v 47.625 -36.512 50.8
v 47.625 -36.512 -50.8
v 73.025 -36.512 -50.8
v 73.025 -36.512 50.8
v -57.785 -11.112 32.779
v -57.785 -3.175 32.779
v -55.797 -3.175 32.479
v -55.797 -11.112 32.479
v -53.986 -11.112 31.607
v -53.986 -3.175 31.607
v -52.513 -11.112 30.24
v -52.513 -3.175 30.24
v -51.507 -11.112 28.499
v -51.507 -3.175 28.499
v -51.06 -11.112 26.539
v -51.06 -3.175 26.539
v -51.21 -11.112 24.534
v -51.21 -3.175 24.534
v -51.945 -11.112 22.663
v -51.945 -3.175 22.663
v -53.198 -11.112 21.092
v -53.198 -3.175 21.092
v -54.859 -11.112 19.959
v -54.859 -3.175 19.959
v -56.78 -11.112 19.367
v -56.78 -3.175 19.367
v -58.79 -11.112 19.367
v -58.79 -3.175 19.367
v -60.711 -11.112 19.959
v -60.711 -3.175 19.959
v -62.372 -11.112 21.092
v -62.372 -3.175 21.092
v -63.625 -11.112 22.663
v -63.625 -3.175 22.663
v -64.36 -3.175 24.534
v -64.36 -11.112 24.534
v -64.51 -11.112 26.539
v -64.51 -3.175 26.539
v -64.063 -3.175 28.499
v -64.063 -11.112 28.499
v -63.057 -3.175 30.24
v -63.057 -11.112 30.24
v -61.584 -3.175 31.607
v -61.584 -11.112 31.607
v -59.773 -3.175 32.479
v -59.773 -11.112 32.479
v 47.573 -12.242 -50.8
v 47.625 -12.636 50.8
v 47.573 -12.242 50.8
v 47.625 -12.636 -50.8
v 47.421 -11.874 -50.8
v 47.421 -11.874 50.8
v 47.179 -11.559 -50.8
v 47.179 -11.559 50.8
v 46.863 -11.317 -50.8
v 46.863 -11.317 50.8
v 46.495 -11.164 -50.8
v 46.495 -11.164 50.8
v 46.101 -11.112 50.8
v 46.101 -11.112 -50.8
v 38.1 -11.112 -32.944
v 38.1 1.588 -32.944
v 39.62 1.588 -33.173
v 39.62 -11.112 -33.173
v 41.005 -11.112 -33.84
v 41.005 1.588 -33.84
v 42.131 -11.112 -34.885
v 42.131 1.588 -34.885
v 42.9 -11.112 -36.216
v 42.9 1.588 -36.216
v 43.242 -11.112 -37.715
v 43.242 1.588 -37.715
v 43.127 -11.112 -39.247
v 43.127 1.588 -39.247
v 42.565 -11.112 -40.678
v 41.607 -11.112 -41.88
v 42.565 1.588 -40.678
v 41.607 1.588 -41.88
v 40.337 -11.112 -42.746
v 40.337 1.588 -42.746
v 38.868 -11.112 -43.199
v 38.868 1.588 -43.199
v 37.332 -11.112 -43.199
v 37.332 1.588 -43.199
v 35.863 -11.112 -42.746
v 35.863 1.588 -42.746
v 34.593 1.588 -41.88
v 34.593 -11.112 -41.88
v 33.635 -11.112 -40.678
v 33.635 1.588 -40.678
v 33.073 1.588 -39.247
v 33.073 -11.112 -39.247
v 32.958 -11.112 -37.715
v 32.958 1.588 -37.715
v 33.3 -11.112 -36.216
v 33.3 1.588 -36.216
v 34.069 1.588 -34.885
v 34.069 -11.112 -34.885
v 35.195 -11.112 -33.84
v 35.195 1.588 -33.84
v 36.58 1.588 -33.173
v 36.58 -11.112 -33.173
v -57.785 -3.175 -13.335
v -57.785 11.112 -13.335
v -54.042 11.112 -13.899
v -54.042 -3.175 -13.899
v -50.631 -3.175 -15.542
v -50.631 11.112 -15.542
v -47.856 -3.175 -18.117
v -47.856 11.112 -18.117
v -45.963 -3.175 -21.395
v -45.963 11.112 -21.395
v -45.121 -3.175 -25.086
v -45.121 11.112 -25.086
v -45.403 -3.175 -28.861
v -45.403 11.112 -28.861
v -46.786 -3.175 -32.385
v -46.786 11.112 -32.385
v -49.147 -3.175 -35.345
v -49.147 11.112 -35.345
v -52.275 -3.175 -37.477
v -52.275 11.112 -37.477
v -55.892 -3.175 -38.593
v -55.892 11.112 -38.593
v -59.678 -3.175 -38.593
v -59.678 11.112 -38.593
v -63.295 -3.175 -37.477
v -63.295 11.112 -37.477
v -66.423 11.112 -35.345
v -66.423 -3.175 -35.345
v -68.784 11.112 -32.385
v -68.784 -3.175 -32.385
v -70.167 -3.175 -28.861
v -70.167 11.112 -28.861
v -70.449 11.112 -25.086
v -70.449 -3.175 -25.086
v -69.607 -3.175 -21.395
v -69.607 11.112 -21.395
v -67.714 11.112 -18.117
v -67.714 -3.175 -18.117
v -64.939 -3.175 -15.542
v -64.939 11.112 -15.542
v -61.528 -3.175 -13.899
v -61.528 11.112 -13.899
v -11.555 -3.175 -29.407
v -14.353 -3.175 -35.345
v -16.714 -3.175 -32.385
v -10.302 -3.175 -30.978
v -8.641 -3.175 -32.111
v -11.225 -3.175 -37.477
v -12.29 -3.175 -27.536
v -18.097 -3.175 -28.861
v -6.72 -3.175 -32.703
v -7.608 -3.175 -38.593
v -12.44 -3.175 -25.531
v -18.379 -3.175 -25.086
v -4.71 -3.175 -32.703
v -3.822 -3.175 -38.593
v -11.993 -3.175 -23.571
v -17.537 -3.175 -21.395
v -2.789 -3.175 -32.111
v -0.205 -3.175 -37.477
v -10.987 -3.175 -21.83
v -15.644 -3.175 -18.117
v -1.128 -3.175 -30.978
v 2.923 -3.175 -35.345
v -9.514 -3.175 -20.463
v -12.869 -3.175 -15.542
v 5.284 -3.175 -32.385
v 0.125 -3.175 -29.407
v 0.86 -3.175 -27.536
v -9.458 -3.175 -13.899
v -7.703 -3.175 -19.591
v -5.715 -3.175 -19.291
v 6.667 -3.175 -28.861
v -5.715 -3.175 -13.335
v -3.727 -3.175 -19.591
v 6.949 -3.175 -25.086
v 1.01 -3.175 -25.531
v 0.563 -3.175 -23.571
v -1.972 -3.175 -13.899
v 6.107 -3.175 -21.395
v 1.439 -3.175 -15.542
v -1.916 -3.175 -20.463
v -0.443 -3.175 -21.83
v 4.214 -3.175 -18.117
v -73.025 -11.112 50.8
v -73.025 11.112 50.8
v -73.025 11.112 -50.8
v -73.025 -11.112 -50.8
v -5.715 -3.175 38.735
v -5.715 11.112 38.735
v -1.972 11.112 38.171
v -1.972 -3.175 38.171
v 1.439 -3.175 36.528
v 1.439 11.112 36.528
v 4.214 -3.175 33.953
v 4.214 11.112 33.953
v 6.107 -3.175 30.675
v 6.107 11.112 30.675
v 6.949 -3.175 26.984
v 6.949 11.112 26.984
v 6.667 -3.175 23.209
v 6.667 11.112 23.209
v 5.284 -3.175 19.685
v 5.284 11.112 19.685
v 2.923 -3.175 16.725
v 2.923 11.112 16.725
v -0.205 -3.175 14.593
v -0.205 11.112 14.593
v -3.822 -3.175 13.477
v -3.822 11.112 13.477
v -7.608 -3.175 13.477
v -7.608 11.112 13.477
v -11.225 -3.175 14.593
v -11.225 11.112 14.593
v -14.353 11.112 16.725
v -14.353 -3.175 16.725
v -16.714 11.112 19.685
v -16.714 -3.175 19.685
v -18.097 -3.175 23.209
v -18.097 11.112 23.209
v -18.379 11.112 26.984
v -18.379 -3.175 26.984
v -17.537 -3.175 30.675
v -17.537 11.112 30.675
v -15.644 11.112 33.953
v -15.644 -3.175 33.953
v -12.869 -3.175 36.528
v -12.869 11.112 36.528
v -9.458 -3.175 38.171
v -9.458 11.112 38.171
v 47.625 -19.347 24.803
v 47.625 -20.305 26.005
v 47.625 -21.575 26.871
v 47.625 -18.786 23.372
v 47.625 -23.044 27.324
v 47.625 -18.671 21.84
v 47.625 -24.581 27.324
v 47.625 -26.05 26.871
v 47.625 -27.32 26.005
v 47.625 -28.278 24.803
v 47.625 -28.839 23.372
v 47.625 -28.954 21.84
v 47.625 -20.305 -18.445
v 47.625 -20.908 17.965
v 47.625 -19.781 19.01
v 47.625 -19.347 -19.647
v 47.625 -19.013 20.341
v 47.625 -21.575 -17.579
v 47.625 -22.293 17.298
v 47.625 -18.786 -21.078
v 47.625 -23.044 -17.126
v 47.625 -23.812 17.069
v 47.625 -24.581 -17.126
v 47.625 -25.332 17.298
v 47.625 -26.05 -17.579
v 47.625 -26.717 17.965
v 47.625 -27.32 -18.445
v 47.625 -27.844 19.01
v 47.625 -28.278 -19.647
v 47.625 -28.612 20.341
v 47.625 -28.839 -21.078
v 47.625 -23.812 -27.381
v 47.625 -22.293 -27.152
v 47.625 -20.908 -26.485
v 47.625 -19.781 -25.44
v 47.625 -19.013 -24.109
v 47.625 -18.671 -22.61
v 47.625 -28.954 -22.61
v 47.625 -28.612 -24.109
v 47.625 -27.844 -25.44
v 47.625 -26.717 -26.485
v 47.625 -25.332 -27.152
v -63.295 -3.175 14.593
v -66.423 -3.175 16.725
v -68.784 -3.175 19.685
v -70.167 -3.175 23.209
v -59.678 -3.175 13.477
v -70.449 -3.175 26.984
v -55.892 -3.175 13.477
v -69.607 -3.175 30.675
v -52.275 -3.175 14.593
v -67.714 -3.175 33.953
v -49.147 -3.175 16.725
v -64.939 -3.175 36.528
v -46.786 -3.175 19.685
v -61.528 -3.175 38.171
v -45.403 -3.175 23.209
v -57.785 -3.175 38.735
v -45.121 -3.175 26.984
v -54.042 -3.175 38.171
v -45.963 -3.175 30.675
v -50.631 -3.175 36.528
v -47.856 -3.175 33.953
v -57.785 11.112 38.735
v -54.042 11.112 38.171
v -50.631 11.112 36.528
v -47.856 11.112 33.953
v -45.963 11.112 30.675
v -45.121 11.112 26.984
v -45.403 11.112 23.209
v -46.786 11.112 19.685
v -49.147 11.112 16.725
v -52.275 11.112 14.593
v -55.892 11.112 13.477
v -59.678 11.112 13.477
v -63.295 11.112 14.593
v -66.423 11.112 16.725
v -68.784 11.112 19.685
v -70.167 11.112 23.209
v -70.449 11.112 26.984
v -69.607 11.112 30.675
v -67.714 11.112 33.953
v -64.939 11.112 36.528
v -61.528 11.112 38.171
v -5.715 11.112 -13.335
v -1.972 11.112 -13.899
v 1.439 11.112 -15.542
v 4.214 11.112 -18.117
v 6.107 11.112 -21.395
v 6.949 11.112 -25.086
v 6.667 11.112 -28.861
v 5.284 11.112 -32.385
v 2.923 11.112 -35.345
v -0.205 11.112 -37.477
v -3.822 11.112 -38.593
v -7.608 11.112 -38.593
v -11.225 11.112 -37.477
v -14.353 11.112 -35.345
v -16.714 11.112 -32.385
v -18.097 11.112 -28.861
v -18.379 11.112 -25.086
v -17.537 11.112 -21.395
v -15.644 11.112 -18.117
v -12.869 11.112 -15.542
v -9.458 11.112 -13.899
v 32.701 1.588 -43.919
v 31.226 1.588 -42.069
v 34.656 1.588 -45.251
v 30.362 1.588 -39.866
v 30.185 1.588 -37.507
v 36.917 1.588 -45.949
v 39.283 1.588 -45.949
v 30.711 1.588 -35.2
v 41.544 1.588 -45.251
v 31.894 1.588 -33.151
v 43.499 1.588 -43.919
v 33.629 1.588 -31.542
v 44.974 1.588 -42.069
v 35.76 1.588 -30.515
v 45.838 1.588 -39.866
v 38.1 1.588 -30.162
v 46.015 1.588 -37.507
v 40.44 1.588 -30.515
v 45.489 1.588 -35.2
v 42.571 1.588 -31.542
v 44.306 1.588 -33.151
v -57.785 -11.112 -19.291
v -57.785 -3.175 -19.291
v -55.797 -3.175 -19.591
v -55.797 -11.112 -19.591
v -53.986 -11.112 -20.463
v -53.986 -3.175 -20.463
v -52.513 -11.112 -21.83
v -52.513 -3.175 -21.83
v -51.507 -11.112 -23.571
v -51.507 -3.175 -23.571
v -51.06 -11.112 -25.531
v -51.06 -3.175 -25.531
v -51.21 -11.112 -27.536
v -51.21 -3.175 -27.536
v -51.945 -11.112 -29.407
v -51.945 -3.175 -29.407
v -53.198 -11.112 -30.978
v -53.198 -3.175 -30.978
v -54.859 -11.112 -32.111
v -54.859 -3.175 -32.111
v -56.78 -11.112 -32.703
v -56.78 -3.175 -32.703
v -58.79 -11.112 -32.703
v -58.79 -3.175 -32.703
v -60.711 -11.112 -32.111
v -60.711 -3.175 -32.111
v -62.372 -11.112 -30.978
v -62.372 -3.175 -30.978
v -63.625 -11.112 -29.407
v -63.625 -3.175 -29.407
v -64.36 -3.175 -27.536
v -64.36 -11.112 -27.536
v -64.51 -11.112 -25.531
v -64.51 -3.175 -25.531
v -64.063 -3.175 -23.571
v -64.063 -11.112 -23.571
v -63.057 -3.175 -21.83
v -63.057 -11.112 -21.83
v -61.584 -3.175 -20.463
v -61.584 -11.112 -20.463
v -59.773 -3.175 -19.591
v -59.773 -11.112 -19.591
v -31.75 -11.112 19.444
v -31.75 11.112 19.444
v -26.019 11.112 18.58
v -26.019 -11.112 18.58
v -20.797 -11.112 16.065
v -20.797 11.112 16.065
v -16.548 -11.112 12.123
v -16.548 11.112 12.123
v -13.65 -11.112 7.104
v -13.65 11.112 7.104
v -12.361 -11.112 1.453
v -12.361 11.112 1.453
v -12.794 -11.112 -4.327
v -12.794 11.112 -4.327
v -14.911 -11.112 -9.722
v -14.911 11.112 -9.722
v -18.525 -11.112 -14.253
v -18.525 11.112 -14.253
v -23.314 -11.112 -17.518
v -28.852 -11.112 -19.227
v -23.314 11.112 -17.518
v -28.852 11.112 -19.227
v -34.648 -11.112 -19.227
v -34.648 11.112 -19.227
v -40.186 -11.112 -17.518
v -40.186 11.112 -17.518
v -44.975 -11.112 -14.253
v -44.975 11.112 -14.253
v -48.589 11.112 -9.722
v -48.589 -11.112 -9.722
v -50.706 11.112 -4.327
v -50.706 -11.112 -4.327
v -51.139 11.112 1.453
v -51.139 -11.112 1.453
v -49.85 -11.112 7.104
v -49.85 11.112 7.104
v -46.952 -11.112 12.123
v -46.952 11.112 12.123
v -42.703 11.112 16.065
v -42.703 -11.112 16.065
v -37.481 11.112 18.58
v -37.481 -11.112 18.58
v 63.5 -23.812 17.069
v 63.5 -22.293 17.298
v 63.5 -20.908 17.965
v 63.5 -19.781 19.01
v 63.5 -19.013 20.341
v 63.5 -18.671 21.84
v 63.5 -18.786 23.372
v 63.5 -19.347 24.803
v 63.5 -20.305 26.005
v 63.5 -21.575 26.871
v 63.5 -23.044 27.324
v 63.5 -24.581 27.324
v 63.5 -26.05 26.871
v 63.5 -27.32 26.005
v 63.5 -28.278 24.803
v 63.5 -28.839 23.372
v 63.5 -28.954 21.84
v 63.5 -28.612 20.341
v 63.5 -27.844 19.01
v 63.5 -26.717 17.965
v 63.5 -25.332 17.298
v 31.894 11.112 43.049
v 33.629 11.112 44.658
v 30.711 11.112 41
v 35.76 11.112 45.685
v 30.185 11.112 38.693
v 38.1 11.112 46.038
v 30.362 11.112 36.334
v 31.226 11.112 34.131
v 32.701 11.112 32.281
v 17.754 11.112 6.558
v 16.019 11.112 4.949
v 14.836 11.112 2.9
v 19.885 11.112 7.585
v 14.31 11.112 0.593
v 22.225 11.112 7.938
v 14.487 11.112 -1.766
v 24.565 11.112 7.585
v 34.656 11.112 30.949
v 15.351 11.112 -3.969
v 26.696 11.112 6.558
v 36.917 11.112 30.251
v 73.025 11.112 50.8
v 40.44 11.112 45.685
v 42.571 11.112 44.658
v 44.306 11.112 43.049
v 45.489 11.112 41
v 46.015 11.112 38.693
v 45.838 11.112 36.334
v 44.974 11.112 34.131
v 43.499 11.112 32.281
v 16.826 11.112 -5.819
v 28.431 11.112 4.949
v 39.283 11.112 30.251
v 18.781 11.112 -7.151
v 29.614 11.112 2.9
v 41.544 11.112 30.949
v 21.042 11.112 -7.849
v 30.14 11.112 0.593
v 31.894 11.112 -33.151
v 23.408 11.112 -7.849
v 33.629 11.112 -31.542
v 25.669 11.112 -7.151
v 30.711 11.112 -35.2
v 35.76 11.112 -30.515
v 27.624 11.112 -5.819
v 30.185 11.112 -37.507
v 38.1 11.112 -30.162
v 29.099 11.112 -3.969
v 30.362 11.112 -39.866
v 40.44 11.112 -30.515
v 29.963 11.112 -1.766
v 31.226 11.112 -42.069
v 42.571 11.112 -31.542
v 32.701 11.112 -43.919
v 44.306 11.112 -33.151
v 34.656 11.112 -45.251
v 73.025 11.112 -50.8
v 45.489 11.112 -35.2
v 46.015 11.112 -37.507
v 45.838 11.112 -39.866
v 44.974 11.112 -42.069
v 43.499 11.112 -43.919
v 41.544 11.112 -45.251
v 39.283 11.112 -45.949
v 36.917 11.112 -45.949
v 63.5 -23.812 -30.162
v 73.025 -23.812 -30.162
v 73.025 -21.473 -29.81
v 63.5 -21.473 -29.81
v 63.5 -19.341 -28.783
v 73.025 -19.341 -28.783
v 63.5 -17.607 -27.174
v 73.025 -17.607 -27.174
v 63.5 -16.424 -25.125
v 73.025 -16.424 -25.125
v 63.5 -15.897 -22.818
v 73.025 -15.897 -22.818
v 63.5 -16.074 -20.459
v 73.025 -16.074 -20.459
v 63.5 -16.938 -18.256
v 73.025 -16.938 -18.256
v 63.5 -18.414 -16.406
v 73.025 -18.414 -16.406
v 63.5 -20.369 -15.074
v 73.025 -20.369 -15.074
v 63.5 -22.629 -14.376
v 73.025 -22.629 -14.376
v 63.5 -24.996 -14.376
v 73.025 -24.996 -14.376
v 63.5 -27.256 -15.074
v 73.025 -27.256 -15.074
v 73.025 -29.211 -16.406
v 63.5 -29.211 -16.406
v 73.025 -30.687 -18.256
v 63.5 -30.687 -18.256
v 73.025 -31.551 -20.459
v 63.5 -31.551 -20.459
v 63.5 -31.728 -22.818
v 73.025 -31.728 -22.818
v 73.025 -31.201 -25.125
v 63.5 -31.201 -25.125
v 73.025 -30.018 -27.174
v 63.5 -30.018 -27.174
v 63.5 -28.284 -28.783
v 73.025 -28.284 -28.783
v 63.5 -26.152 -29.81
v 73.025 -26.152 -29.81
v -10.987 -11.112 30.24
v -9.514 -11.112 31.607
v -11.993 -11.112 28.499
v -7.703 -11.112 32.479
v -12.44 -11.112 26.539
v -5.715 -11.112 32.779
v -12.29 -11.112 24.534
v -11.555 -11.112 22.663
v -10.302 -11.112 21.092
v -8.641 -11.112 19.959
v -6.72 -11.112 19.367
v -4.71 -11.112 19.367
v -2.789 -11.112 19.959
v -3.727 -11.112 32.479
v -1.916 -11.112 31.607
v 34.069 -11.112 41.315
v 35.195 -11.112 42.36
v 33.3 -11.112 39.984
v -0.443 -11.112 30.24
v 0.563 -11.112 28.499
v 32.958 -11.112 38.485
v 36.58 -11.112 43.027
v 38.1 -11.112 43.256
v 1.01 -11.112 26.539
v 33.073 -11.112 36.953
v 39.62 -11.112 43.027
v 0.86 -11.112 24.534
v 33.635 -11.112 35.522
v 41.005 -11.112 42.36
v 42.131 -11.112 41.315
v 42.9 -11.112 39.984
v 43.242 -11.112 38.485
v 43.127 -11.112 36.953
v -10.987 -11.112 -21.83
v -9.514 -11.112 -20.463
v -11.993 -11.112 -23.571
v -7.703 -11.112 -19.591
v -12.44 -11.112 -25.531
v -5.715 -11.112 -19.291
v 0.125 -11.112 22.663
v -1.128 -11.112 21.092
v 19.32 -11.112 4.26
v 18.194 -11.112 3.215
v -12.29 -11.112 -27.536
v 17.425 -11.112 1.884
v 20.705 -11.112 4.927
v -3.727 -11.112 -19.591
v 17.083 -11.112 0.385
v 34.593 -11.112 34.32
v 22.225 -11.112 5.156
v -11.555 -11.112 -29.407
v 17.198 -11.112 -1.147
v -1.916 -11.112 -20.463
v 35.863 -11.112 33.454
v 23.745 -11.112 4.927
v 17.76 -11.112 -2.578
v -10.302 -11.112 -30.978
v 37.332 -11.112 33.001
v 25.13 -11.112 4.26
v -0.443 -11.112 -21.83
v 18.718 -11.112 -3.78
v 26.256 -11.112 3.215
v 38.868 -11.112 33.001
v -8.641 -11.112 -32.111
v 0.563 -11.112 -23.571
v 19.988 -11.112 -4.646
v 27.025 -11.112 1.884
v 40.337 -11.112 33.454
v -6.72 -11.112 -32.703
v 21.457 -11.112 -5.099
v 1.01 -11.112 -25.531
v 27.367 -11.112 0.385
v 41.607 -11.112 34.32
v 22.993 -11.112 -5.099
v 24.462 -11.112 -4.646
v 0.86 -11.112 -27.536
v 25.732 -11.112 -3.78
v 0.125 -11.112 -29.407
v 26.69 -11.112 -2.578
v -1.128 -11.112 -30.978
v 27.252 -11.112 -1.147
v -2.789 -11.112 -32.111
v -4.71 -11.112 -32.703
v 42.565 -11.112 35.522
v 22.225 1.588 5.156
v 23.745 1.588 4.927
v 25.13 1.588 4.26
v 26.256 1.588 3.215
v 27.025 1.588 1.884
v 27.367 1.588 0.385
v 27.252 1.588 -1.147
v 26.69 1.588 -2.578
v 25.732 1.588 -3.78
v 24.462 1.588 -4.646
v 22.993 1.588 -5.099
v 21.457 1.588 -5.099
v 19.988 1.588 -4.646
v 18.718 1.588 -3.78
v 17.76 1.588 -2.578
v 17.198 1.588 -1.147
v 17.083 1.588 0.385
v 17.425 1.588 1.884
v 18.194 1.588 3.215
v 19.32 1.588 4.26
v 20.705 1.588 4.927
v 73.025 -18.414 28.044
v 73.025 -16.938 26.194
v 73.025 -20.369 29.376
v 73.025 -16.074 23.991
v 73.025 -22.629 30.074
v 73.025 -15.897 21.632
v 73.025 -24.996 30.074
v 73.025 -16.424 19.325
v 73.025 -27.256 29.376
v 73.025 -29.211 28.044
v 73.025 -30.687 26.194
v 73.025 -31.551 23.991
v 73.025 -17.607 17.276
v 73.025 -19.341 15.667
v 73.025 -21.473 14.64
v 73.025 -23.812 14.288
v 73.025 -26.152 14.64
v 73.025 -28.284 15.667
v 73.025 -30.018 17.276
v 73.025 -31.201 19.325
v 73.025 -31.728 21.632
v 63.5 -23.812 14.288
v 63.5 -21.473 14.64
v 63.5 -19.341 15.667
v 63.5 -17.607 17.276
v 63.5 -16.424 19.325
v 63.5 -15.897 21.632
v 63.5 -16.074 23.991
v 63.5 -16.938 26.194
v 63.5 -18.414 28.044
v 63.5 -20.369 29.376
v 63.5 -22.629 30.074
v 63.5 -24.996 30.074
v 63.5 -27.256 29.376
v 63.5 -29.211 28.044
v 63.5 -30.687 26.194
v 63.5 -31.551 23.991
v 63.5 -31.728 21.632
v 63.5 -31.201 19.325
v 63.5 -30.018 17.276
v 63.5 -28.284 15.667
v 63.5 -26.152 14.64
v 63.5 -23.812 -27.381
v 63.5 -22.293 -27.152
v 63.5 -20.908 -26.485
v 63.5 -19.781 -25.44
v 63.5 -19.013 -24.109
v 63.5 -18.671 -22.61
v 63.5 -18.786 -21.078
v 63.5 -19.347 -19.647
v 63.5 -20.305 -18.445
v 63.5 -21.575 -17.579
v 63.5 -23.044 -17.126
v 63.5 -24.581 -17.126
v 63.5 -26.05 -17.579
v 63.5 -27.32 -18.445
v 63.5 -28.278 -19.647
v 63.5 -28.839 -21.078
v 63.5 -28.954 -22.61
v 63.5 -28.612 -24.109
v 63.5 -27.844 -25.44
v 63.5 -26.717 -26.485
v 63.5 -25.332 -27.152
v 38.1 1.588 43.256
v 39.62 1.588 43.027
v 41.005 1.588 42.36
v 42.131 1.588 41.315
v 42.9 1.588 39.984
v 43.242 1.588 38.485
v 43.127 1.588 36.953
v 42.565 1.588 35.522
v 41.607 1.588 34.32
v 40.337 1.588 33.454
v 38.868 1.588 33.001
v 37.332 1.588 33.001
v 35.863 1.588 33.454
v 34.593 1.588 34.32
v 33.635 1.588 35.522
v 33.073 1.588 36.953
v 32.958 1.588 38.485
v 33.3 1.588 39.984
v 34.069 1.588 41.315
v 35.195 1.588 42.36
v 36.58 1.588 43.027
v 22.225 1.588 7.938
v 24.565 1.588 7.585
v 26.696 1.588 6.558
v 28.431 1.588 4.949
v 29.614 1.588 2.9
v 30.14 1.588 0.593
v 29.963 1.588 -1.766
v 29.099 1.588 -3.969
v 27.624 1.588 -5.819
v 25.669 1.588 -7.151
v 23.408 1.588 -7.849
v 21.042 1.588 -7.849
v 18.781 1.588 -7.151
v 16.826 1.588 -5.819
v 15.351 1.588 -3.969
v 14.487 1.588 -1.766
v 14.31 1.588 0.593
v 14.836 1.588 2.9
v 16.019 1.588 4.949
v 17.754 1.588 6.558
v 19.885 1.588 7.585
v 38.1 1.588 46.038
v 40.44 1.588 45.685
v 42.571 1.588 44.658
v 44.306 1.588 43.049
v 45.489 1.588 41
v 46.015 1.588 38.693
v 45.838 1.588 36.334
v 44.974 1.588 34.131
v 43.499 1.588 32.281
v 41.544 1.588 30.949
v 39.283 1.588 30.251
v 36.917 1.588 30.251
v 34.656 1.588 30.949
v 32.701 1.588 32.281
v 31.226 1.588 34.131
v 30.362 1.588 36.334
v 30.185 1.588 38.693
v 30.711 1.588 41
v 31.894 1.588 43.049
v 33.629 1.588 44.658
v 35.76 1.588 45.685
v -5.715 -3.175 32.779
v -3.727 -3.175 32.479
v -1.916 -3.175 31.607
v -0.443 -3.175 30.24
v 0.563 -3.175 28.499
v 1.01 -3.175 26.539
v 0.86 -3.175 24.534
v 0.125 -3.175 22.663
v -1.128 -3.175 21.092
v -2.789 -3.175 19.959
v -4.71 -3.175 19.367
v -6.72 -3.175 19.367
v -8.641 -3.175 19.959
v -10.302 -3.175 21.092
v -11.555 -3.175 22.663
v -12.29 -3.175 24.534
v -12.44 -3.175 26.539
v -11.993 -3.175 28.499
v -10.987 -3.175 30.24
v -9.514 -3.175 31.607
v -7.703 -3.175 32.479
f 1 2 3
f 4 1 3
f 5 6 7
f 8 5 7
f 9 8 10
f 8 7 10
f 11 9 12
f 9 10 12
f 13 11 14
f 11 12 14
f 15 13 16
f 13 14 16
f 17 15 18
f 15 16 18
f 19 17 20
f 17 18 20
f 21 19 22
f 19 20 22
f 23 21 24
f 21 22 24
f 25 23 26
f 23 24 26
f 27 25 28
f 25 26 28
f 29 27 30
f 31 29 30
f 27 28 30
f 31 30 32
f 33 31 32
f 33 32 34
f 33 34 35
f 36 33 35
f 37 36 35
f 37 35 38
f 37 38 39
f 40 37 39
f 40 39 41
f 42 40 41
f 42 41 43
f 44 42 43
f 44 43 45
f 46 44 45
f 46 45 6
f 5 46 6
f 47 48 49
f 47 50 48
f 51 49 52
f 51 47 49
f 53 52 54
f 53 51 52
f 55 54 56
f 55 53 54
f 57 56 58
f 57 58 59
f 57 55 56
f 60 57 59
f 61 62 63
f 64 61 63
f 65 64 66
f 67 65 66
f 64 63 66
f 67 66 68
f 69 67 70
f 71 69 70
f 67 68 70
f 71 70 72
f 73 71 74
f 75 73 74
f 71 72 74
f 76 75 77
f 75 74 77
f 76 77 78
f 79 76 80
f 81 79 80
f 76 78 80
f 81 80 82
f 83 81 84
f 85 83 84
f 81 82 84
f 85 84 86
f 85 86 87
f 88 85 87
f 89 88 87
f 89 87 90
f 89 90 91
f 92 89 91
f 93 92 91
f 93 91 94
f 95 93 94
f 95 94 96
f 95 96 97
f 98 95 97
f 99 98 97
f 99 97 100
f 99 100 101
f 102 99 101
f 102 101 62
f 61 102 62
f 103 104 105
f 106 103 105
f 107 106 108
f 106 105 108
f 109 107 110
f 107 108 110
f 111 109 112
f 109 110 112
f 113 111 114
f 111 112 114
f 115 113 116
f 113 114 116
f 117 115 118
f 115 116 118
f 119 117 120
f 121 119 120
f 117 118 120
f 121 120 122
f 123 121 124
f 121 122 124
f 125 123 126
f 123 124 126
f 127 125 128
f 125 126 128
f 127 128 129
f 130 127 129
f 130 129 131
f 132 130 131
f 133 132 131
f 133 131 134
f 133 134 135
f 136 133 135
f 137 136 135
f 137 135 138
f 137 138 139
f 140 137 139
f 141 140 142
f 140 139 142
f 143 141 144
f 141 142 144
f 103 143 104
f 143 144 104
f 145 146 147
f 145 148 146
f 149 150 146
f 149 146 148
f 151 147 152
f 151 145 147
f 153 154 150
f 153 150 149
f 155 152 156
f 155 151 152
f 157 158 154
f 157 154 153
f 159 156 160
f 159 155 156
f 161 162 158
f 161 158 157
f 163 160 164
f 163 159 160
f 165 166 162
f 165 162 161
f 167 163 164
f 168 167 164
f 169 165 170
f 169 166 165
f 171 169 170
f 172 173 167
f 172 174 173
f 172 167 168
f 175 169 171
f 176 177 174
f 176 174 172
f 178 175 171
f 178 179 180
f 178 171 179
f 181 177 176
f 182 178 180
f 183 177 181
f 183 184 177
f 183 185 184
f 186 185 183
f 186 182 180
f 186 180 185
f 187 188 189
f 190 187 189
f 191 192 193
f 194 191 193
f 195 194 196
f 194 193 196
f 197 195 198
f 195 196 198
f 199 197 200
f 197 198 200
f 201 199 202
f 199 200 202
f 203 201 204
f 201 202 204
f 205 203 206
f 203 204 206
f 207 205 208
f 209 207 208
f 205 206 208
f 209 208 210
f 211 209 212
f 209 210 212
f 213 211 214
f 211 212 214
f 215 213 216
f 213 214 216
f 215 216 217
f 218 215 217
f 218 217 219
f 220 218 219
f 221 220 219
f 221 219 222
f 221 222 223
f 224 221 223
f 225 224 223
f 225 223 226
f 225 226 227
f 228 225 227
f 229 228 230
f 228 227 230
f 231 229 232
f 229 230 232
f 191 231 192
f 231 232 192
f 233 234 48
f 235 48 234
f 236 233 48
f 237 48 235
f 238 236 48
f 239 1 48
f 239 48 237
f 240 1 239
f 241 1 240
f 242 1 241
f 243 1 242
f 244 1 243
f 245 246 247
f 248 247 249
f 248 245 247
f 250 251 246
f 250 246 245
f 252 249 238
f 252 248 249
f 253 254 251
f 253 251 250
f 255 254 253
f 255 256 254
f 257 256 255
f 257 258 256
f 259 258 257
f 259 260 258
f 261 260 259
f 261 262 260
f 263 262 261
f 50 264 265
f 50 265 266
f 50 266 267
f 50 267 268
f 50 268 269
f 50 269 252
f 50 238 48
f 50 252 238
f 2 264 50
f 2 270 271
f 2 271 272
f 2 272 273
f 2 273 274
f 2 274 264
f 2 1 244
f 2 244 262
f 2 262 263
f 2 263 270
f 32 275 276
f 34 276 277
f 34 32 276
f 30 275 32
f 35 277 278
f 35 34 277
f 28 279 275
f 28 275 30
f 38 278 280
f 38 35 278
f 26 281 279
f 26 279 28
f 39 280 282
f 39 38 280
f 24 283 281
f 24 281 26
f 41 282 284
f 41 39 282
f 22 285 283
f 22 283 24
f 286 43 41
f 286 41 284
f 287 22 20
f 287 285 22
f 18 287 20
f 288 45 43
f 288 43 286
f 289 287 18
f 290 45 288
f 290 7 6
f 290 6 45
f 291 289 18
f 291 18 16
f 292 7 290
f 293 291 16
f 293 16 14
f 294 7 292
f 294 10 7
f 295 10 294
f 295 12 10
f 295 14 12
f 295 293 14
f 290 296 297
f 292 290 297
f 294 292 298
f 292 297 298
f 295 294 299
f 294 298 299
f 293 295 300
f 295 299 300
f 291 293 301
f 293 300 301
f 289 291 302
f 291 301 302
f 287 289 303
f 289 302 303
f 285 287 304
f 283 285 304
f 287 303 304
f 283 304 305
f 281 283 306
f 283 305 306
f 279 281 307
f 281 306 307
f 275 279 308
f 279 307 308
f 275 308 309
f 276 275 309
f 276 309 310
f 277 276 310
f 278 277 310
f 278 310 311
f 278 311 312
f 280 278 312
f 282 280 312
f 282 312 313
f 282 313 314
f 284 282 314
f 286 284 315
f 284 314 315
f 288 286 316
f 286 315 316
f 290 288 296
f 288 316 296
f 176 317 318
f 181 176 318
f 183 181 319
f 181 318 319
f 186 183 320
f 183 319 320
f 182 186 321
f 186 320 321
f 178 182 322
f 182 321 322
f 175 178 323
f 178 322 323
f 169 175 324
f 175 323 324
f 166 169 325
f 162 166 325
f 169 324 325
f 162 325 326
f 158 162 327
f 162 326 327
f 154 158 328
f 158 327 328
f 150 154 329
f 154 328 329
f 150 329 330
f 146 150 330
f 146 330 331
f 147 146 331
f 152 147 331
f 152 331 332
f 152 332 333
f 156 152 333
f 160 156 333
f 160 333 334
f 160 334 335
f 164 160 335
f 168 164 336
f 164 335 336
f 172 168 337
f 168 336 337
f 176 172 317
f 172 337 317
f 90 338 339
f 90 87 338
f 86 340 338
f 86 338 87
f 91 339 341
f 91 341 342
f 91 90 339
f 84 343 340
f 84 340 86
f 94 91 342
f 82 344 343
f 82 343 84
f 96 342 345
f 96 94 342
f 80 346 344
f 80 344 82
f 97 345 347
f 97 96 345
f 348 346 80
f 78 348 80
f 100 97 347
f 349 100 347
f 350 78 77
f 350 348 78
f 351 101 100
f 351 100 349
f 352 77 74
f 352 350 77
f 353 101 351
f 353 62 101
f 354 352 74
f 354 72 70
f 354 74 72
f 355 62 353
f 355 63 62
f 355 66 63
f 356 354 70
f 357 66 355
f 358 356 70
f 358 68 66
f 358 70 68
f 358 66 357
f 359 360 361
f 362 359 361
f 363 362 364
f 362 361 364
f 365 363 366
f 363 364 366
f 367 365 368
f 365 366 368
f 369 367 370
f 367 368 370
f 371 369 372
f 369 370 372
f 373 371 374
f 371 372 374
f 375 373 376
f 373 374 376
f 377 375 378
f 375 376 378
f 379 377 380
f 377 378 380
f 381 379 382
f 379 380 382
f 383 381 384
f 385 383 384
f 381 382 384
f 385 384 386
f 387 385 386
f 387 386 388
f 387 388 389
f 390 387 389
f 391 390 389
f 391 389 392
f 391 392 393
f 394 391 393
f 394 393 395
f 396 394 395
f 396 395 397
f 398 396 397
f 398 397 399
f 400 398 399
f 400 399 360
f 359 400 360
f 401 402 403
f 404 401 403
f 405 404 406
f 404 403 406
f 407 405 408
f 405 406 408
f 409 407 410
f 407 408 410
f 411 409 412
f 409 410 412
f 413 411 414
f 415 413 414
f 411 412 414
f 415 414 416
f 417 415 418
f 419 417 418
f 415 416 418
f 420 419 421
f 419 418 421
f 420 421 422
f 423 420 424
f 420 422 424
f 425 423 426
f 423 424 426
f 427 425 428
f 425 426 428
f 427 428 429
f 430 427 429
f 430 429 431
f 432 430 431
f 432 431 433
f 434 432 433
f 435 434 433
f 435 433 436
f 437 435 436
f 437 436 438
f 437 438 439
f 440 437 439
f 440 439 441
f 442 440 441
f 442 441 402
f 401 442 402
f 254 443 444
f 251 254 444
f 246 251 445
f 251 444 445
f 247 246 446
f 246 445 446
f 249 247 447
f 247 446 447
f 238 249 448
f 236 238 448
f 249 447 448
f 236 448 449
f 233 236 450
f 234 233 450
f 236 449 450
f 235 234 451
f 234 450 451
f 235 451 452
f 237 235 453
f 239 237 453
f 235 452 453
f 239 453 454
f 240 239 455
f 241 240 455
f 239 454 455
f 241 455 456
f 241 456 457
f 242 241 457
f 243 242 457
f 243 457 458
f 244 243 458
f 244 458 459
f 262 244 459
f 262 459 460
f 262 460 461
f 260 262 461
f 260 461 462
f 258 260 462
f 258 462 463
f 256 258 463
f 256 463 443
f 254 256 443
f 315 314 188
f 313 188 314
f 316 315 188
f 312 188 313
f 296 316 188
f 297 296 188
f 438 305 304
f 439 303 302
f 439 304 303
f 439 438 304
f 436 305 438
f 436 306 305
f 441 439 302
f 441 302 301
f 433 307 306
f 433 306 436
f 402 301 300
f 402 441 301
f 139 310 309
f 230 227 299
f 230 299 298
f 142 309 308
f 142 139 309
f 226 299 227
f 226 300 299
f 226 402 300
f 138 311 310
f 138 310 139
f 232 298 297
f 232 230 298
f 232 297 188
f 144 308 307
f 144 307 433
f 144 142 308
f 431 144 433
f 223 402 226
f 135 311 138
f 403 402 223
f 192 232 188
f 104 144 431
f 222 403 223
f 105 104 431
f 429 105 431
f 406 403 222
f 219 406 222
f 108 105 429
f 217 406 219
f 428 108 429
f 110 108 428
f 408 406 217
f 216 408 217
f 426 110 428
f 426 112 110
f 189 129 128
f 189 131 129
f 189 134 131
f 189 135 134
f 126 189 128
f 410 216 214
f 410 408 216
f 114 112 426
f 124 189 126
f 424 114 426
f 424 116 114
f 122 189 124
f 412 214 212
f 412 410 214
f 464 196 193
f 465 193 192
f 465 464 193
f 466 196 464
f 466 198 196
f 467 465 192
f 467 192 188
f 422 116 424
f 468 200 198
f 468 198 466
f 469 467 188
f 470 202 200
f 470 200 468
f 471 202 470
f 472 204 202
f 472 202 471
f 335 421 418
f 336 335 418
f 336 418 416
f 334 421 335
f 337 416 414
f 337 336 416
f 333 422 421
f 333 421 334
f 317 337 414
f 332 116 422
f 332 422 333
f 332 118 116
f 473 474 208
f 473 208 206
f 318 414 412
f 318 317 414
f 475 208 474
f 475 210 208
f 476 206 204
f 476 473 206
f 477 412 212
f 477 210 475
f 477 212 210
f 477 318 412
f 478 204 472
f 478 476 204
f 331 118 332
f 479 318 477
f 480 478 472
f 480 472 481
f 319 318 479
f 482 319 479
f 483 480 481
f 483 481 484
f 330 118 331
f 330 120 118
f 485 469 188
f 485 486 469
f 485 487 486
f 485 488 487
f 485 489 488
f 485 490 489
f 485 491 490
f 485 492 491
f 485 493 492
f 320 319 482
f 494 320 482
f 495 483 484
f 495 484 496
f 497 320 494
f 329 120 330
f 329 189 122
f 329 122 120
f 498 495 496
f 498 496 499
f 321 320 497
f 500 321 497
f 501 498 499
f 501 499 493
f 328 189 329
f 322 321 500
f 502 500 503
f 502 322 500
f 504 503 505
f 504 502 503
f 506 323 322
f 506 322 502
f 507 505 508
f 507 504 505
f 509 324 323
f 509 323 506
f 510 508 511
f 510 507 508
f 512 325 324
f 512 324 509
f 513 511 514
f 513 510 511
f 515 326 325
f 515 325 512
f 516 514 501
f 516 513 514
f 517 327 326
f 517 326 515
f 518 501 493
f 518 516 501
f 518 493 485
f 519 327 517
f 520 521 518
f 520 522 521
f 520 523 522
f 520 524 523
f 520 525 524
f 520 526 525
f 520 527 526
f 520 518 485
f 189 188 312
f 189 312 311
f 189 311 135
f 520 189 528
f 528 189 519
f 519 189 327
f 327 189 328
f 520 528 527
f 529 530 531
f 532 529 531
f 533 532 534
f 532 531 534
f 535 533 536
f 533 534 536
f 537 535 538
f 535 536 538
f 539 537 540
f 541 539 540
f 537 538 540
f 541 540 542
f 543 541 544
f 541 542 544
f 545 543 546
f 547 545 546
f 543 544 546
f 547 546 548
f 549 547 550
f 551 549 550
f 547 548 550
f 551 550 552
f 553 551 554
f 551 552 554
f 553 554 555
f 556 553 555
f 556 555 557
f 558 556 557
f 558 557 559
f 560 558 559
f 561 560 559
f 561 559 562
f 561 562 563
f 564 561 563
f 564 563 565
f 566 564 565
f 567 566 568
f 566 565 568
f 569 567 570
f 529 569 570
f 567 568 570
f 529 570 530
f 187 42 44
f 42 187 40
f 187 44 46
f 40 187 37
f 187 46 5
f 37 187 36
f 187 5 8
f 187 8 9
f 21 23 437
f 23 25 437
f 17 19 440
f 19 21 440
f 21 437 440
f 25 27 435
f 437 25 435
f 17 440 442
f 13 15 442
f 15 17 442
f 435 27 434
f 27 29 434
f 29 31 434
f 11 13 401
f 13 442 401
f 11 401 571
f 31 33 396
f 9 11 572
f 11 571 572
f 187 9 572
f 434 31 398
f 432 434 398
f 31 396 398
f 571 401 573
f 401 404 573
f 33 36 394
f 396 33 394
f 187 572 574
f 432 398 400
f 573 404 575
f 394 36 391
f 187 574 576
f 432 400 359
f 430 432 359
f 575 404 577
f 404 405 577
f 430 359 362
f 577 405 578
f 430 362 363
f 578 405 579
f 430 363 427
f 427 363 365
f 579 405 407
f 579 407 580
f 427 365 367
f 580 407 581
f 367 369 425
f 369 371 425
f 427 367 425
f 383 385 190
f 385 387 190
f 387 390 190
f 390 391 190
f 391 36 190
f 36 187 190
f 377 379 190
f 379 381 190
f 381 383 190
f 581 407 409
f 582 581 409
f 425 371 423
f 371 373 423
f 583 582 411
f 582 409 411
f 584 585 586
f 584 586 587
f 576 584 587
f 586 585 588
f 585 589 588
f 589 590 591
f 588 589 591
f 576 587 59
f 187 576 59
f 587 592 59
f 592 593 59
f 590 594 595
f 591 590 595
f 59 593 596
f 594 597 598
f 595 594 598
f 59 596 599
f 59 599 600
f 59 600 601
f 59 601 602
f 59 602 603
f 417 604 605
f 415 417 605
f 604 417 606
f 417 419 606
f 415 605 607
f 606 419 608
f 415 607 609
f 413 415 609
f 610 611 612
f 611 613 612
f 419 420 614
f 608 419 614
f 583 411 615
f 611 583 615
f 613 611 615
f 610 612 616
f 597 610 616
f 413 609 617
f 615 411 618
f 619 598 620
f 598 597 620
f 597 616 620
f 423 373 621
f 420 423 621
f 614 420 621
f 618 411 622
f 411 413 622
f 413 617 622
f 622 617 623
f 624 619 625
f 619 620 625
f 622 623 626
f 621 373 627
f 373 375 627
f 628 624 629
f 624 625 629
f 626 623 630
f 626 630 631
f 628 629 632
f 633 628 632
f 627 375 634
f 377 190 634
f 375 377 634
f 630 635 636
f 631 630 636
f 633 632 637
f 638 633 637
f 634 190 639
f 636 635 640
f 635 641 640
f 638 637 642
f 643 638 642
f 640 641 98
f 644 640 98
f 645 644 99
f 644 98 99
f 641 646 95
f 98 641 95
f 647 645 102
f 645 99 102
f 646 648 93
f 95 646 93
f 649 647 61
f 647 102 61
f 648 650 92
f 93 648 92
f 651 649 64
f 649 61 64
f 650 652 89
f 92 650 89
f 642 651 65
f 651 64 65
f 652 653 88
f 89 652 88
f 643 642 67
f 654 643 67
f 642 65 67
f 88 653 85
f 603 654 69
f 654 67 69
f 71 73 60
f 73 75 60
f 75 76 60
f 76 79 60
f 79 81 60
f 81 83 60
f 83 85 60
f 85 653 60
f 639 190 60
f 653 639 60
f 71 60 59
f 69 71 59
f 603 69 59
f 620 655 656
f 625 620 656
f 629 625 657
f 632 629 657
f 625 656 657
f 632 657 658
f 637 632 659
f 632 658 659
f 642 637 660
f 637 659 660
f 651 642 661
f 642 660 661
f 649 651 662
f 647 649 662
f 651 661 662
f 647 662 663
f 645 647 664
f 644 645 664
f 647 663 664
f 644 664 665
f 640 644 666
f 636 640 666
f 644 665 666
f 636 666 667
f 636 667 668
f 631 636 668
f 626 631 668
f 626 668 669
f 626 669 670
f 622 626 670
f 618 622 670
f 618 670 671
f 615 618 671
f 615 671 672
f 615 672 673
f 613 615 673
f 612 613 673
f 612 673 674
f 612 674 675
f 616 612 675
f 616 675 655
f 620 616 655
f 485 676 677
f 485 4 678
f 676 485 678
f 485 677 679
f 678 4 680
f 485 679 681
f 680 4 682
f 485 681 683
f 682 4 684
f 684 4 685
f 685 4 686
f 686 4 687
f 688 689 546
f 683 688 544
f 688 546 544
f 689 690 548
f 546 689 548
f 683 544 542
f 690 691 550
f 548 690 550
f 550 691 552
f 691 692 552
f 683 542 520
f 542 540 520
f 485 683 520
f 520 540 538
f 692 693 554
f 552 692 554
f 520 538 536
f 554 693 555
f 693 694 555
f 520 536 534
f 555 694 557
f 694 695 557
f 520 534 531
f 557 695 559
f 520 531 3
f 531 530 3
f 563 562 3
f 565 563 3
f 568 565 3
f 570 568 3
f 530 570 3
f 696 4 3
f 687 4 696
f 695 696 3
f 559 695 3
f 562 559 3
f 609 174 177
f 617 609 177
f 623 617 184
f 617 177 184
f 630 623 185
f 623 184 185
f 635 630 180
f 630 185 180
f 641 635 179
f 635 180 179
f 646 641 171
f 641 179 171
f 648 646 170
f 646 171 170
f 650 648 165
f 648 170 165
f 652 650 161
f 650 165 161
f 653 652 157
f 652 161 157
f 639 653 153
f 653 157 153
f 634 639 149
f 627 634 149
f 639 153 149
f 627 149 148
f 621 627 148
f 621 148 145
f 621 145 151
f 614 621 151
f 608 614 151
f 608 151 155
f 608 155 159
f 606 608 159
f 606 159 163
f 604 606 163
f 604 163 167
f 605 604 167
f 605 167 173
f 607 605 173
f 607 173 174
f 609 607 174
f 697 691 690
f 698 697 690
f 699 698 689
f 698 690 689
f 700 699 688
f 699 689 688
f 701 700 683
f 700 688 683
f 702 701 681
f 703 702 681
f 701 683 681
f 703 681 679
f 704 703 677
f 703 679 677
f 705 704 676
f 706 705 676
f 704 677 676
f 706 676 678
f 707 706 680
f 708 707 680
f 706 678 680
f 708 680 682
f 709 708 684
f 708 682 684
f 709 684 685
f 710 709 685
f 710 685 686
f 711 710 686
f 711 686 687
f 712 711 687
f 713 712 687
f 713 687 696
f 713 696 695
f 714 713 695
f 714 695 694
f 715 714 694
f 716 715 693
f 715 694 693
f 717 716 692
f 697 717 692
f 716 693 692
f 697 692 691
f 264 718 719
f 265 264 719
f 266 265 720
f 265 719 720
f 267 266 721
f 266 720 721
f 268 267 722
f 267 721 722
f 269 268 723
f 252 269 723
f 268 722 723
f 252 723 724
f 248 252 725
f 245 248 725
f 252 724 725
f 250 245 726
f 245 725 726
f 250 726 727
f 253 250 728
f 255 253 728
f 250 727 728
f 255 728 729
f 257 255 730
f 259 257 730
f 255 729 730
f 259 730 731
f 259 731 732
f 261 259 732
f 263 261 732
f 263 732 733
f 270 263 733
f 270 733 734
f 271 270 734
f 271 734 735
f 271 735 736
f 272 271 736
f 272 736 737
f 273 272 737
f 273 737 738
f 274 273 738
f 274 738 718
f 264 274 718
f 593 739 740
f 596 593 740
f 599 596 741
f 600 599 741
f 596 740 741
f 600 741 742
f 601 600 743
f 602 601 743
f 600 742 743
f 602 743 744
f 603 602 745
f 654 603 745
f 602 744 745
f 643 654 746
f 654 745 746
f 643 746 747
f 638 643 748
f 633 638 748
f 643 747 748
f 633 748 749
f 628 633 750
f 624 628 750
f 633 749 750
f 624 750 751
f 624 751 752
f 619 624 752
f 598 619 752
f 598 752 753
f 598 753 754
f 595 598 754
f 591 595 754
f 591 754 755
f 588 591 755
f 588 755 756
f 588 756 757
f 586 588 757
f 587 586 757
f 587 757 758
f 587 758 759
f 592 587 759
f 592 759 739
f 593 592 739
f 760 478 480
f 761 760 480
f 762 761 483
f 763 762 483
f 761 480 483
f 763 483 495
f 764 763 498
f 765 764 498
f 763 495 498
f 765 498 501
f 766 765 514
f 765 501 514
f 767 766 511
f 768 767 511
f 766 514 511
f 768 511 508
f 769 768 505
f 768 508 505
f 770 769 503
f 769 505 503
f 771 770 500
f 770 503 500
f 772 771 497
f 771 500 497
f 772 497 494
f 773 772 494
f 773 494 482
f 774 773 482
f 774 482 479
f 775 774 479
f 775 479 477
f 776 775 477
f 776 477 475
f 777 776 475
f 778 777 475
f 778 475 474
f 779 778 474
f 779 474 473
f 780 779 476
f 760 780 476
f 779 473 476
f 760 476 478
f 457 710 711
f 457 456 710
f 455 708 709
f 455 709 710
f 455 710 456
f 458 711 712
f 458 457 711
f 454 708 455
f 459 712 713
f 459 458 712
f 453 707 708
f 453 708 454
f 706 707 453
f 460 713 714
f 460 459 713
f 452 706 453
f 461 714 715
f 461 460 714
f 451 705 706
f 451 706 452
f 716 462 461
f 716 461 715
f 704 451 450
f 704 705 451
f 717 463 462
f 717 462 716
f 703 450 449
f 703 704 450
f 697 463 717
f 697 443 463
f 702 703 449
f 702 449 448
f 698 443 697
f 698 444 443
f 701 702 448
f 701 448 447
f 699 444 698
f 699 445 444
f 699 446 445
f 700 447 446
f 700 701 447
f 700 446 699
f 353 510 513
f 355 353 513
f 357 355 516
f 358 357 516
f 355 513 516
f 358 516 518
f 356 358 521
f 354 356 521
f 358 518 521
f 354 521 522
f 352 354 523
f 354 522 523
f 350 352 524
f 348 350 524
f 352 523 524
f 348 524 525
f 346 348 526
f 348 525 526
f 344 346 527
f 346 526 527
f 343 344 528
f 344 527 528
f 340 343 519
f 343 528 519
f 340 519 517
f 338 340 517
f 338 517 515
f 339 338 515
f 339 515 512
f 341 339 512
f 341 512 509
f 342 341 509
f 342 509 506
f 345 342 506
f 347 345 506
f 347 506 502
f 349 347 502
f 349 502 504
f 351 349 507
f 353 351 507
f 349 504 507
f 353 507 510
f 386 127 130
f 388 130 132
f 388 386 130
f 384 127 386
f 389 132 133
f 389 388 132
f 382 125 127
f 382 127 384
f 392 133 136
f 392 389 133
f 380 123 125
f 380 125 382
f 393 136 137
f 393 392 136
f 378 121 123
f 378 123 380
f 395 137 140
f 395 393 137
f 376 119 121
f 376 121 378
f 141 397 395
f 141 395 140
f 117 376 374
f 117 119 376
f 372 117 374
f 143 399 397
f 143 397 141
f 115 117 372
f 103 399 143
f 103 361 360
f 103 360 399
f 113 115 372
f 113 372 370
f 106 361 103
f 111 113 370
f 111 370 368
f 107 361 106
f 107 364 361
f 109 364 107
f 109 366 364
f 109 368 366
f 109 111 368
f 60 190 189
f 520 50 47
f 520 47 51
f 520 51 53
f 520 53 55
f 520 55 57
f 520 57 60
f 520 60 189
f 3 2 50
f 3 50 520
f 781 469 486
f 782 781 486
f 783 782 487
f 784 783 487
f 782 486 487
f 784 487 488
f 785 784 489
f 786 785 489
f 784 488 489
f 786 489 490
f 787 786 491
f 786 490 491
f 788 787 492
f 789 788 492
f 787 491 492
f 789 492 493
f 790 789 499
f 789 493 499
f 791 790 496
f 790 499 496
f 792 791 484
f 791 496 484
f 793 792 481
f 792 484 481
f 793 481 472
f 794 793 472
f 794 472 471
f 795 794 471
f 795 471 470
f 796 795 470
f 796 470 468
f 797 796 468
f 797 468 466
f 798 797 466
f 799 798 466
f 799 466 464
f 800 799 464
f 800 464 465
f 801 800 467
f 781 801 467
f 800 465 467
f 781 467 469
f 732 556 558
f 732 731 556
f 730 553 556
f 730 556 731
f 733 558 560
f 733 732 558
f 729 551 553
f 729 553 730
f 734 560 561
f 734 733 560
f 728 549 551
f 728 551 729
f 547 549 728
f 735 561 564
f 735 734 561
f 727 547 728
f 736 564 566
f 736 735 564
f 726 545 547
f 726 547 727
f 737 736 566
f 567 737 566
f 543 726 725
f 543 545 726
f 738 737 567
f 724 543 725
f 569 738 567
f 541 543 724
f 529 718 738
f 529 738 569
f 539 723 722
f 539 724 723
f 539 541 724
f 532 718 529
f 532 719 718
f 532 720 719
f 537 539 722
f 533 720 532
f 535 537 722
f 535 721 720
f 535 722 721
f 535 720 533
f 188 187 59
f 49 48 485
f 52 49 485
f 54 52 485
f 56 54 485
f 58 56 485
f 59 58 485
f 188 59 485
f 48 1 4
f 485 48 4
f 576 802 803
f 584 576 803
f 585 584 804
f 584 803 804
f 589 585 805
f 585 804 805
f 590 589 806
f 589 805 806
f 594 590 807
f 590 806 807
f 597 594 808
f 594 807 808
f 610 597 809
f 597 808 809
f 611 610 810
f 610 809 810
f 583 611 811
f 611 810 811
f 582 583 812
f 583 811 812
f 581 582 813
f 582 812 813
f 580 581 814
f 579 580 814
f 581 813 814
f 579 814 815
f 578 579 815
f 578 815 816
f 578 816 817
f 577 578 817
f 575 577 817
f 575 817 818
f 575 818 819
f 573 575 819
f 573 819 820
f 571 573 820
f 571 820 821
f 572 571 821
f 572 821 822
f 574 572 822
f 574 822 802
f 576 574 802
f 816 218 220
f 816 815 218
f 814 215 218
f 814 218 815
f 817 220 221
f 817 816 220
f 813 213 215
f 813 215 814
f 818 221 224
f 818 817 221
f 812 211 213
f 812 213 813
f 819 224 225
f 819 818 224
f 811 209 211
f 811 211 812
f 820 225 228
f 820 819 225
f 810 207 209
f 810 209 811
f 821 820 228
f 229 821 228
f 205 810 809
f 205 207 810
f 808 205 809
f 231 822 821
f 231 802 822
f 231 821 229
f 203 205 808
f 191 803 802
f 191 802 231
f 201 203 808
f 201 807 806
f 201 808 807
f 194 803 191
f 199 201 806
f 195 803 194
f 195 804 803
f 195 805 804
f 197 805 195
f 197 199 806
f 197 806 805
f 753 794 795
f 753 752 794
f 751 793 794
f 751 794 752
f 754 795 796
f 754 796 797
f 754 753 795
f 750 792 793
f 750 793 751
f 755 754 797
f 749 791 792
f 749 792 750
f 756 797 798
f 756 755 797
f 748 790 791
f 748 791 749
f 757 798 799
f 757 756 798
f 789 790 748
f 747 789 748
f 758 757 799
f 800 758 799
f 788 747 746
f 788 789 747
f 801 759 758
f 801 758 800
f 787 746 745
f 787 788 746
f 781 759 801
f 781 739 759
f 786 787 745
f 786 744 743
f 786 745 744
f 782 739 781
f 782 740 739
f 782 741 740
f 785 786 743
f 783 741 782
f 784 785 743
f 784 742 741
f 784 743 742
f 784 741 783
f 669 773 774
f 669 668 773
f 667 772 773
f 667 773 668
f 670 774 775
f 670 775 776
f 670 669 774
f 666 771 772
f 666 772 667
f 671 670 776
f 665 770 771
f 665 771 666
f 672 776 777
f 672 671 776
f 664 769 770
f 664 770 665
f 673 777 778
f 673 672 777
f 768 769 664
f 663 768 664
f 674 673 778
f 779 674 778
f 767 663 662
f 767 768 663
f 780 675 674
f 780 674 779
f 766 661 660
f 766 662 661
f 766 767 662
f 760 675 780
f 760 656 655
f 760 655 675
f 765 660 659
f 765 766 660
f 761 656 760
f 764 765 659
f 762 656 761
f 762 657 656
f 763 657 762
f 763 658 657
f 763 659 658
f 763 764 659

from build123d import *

# Parameters (mm, degrees)
SKETCH1_W           = 146.05
SKETCH1_H           = 101.6
BOSS_EXTRUDE1_DEPTH = 11.1125
BOSS_EXTRUDE2_START = -36.5125
SKETCH2_W           = 25.4
SKETCH2_H           = 101.6
BOSS_EXTRUDE2_DEPTH = 25.4
FILLET1_R           = 1.524
CUT_EXTRUDE2_START  = 11.1125
SKETCH3_R           = 19.4437
CUT_EXTRUDE2_DEPTH  = 36.5125
CUT_EXTRUDE4_START  = 11.1125
SKETCH4_R           = 6.7437
CUT_EXTRUDE4_DEPTH  = 108.270980028
CUT_EXTRUDE6_START  = 11.1125
SKETCH5_R           = 12.7
CUT_EXTRUDE6_DEPTH  = 14.2875
CUT_EXTRUDE8_START  = 11.1125
SKETCH6_R           = 5.1562
CUT_EXTRUDE8_DEPTH  = 108.270980028
CUT_EXTRUDE10_START = 11.1125
SKETCH7_R           = 7.9375
CUT_EXTRUDE10_DEPTH = 9.525
CUT_EXTRUDE12_START = 11.1125
SKETCH8_R           = 5.1562
CUT_EXTRUDE12_DEPTH = 108.270980028
CUT_EXTRUDE14_START = 11.1125
SKETCH9_R           = 7.9375
CUT_EXTRUDE14_DEPTH = 9.525
CUT_EXTRUDE16_START = 73.025
SKETCH10_R          = 5.1562
CUT_EXTRUDE16_DEPTH = 170.183480028
CUT_EXTRUDE18_START = 73.025
SKETCH11_R          = 7.9375
CUT_EXTRUDE18_DEPTH = 9.525


with BuildPart() as part:
    # Sketch1 → Boss-Extrude1 (new, symmetric)
    with BuildSketch(Plane(origin=(0, 0, 0), x_dir=(1, 0, 0), z_dir=(0, 1, 0))):
        Rectangle(SKETCH1_W, SKETCH1_H)
    extrude(amount=BOSS_EXTRUDE1_DEPTH, both=True)

    # Sketch2 → Boss-Extrude2 (add)
    with BuildSketch(Plane(origin=(0, 0, 0), x_dir=(1, 0, 0), z_dir=(0, 1, 0)).offset(BOSS_EXTRUDE2_START)):
        with Locations((60.325, 0)):
            Rectangle(SKETCH2_W, SKETCH2_H)
    extrude(amount=BOSS_EXTRUDE2_DEPTH)

    # Fillet1
    fillet1_edges = [part.edges().sort_by_distance(p)[0] for p in [
        (47.625, -11.1125, 0),
    ]]
    fillet(fillet1_edges, radius=FILLET1_R)

    # Sketch3 → Cut-Extrude2 (cut)
    with BuildSketch(Plane(origin=(0, 0, 0), x_dir=(1, 0, 0), z_dir=(0, 1, 0)).offset(CUT_EXTRUDE2_START)):
        with Locations(Location((-31.75, 0, 0), (0, 0, 270))):
            Circle(SKETCH3_R)
    extrude(amount=-CUT_EXTRUDE2_DEPTH, mode=Mode.SUBTRACT)

    # Sketch4 → Cut-Extrude4 (cut, through all)
    with BuildSketch(Plane(origin=(0, 0, 0), x_dir=(1, 0, 0), z_dir=(0, 1, 0)).offset(CUT_EXTRUDE4_START)):
        with Locations(Location((-57.785, -26.035, 0), (0, 0, 270))):
            Circle(SKETCH4_R)
        with Locations(Location((-5.715, -26.035, 0), (0, 0, 270))):
            Circle(SKETCH4_R)
        with Locations(Location((-57.785, 26.035, 0), (0, 0, 270))):
            Circle(SKETCH4_R)
        with Locations(Location((-5.715, 26.035, 0), (0, 0, 270))):
            Circle(SKETCH4_R)
    extrude(amount=-CUT_EXTRUDE4_DEPTH, mode=Mode.SUBTRACT)

    # Sketch5 → Cut-Extrude6 (cut)
    with BuildSketch(Plane(origin=(0, 0, 0), x_dir=(1, 0, 0), z_dir=(0, 1, 0)).offset(CUT_EXTRUDE6_START)):
        with Locations(Location((-57.785, -26.035, 0), (0, 0, 270))):
            Circle(SKETCH5_R)
        with Locations(Location((-5.715, -26.035, 0), (0, 0, 270))):
            Circle(SKETCH5_R)
        with Locations(Location((-57.785, 26.035, 0), (0, 0, 270))):
            Circle(SKETCH5_R)
        with Locations(Location((-5.715, 26.035, 0), (0, 0, 270))):
            Circle(SKETCH5_R)
    extrude(amount=-CUT_EXTRUDE6_DEPTH, mode=Mode.SUBTRACT)

    # Sketch6 → Cut-Extrude8 (cut, through all)
    with BuildSketch(Plane(origin=(0, 0, 0), x_dir=(1, 0, 0), z_dir=(0, 1, 0)).offset(CUT_EXTRUDE8_START)):
        with Locations(Location((38.1, -38.1, 0), (0, 0, 270))):
            Circle(SKETCH6_R)
        with Locations(Location((38.1, 38.1, 0), (0, 0, 270))):
            Circle(SKETCH6_R)
    extrude(amount=-CUT_EXTRUDE8_DEPTH, mode=Mode.SUBTRACT)

    # Sketch7 → Cut-Extrude10 (cut)
    with BuildSketch(Plane(origin=(0, 0, 0), x_dir=(1, 0, 0), z_dir=(0, 1, 0)).offset(CUT_EXTRUDE10_START)):
        with Locations(Location((38.1, -38.1, 0), (0, 0, 270))):
            Circle(SKETCH7_R)
        with Locations(Location((38.1, 38.1, 0), (0, 0, 270))):
            Circle(SKETCH7_R)
    extrude(amount=-CUT_EXTRUDE10_DEPTH, mode=Mode.SUBTRACT)

    # Sketch8 → Cut-Extrude12 (cut, through all)
    with BuildSketch(Plane(origin=(0, 0, 0), x_dir=(1, 0, 0), z_dir=(0, 1, 0)).offset(CUT_EXTRUDE12_START)):
        with Locations(Location((22.225, 0, 0), (0, 0, 270))):
            Circle(SKETCH8_R)
    extrude(amount=-CUT_EXTRUDE12_DEPTH, mode=Mode.SUBTRACT)

    # Sketch9 → Cut-Extrude14 (cut)
    with BuildSketch(Plane(origin=(0, 0, 0), x_dir=(1, 0, 0), z_dir=(0, 1, 0)).offset(CUT_EXTRUDE14_START)):
        with Locations(Location((22.225, 0, 0), (0, 0, 270))):
            Circle(SKETCH9_R)
    extrude(amount=-CUT_EXTRUDE14_DEPTH, mode=Mode.SUBTRACT)

    # Sketch10 → Cut-Extrude16 (cut, through all)
    with BuildSketch(Plane(origin=(0, 0, 0), x_dir=(0, 0, -1), z_dir=(1, 0, 0)).offset(CUT_EXTRUDE16_START)):
        with Locations((-22.225, -23.8125)):
            Circle(SKETCH10_R)
        with Locations((22.225, -23.8125)):
            Circle(SKETCH10_R)
    extrude(amount=-CUT_EXTRUDE16_DEPTH, mode=Mode.SUBTRACT)

    # Sketch11 → Cut-Extrude18 (cut)
    with BuildSketch(Plane(origin=(0, 0, 0), x_dir=(0, 0, -1), z_dir=(1, 0, 0)).offset(CUT_EXTRUDE18_START)):
        with Locations((-22.225, -23.8125)):
            Circle(SKETCH11_R)
        with Locations((22.225, -23.8125)):
            Circle(SKETCH11_R)
    extrude(amount=-CUT_EXTRUDE18_DEPTH, mode=Mode.SUBTRACT)


solid = part.part
